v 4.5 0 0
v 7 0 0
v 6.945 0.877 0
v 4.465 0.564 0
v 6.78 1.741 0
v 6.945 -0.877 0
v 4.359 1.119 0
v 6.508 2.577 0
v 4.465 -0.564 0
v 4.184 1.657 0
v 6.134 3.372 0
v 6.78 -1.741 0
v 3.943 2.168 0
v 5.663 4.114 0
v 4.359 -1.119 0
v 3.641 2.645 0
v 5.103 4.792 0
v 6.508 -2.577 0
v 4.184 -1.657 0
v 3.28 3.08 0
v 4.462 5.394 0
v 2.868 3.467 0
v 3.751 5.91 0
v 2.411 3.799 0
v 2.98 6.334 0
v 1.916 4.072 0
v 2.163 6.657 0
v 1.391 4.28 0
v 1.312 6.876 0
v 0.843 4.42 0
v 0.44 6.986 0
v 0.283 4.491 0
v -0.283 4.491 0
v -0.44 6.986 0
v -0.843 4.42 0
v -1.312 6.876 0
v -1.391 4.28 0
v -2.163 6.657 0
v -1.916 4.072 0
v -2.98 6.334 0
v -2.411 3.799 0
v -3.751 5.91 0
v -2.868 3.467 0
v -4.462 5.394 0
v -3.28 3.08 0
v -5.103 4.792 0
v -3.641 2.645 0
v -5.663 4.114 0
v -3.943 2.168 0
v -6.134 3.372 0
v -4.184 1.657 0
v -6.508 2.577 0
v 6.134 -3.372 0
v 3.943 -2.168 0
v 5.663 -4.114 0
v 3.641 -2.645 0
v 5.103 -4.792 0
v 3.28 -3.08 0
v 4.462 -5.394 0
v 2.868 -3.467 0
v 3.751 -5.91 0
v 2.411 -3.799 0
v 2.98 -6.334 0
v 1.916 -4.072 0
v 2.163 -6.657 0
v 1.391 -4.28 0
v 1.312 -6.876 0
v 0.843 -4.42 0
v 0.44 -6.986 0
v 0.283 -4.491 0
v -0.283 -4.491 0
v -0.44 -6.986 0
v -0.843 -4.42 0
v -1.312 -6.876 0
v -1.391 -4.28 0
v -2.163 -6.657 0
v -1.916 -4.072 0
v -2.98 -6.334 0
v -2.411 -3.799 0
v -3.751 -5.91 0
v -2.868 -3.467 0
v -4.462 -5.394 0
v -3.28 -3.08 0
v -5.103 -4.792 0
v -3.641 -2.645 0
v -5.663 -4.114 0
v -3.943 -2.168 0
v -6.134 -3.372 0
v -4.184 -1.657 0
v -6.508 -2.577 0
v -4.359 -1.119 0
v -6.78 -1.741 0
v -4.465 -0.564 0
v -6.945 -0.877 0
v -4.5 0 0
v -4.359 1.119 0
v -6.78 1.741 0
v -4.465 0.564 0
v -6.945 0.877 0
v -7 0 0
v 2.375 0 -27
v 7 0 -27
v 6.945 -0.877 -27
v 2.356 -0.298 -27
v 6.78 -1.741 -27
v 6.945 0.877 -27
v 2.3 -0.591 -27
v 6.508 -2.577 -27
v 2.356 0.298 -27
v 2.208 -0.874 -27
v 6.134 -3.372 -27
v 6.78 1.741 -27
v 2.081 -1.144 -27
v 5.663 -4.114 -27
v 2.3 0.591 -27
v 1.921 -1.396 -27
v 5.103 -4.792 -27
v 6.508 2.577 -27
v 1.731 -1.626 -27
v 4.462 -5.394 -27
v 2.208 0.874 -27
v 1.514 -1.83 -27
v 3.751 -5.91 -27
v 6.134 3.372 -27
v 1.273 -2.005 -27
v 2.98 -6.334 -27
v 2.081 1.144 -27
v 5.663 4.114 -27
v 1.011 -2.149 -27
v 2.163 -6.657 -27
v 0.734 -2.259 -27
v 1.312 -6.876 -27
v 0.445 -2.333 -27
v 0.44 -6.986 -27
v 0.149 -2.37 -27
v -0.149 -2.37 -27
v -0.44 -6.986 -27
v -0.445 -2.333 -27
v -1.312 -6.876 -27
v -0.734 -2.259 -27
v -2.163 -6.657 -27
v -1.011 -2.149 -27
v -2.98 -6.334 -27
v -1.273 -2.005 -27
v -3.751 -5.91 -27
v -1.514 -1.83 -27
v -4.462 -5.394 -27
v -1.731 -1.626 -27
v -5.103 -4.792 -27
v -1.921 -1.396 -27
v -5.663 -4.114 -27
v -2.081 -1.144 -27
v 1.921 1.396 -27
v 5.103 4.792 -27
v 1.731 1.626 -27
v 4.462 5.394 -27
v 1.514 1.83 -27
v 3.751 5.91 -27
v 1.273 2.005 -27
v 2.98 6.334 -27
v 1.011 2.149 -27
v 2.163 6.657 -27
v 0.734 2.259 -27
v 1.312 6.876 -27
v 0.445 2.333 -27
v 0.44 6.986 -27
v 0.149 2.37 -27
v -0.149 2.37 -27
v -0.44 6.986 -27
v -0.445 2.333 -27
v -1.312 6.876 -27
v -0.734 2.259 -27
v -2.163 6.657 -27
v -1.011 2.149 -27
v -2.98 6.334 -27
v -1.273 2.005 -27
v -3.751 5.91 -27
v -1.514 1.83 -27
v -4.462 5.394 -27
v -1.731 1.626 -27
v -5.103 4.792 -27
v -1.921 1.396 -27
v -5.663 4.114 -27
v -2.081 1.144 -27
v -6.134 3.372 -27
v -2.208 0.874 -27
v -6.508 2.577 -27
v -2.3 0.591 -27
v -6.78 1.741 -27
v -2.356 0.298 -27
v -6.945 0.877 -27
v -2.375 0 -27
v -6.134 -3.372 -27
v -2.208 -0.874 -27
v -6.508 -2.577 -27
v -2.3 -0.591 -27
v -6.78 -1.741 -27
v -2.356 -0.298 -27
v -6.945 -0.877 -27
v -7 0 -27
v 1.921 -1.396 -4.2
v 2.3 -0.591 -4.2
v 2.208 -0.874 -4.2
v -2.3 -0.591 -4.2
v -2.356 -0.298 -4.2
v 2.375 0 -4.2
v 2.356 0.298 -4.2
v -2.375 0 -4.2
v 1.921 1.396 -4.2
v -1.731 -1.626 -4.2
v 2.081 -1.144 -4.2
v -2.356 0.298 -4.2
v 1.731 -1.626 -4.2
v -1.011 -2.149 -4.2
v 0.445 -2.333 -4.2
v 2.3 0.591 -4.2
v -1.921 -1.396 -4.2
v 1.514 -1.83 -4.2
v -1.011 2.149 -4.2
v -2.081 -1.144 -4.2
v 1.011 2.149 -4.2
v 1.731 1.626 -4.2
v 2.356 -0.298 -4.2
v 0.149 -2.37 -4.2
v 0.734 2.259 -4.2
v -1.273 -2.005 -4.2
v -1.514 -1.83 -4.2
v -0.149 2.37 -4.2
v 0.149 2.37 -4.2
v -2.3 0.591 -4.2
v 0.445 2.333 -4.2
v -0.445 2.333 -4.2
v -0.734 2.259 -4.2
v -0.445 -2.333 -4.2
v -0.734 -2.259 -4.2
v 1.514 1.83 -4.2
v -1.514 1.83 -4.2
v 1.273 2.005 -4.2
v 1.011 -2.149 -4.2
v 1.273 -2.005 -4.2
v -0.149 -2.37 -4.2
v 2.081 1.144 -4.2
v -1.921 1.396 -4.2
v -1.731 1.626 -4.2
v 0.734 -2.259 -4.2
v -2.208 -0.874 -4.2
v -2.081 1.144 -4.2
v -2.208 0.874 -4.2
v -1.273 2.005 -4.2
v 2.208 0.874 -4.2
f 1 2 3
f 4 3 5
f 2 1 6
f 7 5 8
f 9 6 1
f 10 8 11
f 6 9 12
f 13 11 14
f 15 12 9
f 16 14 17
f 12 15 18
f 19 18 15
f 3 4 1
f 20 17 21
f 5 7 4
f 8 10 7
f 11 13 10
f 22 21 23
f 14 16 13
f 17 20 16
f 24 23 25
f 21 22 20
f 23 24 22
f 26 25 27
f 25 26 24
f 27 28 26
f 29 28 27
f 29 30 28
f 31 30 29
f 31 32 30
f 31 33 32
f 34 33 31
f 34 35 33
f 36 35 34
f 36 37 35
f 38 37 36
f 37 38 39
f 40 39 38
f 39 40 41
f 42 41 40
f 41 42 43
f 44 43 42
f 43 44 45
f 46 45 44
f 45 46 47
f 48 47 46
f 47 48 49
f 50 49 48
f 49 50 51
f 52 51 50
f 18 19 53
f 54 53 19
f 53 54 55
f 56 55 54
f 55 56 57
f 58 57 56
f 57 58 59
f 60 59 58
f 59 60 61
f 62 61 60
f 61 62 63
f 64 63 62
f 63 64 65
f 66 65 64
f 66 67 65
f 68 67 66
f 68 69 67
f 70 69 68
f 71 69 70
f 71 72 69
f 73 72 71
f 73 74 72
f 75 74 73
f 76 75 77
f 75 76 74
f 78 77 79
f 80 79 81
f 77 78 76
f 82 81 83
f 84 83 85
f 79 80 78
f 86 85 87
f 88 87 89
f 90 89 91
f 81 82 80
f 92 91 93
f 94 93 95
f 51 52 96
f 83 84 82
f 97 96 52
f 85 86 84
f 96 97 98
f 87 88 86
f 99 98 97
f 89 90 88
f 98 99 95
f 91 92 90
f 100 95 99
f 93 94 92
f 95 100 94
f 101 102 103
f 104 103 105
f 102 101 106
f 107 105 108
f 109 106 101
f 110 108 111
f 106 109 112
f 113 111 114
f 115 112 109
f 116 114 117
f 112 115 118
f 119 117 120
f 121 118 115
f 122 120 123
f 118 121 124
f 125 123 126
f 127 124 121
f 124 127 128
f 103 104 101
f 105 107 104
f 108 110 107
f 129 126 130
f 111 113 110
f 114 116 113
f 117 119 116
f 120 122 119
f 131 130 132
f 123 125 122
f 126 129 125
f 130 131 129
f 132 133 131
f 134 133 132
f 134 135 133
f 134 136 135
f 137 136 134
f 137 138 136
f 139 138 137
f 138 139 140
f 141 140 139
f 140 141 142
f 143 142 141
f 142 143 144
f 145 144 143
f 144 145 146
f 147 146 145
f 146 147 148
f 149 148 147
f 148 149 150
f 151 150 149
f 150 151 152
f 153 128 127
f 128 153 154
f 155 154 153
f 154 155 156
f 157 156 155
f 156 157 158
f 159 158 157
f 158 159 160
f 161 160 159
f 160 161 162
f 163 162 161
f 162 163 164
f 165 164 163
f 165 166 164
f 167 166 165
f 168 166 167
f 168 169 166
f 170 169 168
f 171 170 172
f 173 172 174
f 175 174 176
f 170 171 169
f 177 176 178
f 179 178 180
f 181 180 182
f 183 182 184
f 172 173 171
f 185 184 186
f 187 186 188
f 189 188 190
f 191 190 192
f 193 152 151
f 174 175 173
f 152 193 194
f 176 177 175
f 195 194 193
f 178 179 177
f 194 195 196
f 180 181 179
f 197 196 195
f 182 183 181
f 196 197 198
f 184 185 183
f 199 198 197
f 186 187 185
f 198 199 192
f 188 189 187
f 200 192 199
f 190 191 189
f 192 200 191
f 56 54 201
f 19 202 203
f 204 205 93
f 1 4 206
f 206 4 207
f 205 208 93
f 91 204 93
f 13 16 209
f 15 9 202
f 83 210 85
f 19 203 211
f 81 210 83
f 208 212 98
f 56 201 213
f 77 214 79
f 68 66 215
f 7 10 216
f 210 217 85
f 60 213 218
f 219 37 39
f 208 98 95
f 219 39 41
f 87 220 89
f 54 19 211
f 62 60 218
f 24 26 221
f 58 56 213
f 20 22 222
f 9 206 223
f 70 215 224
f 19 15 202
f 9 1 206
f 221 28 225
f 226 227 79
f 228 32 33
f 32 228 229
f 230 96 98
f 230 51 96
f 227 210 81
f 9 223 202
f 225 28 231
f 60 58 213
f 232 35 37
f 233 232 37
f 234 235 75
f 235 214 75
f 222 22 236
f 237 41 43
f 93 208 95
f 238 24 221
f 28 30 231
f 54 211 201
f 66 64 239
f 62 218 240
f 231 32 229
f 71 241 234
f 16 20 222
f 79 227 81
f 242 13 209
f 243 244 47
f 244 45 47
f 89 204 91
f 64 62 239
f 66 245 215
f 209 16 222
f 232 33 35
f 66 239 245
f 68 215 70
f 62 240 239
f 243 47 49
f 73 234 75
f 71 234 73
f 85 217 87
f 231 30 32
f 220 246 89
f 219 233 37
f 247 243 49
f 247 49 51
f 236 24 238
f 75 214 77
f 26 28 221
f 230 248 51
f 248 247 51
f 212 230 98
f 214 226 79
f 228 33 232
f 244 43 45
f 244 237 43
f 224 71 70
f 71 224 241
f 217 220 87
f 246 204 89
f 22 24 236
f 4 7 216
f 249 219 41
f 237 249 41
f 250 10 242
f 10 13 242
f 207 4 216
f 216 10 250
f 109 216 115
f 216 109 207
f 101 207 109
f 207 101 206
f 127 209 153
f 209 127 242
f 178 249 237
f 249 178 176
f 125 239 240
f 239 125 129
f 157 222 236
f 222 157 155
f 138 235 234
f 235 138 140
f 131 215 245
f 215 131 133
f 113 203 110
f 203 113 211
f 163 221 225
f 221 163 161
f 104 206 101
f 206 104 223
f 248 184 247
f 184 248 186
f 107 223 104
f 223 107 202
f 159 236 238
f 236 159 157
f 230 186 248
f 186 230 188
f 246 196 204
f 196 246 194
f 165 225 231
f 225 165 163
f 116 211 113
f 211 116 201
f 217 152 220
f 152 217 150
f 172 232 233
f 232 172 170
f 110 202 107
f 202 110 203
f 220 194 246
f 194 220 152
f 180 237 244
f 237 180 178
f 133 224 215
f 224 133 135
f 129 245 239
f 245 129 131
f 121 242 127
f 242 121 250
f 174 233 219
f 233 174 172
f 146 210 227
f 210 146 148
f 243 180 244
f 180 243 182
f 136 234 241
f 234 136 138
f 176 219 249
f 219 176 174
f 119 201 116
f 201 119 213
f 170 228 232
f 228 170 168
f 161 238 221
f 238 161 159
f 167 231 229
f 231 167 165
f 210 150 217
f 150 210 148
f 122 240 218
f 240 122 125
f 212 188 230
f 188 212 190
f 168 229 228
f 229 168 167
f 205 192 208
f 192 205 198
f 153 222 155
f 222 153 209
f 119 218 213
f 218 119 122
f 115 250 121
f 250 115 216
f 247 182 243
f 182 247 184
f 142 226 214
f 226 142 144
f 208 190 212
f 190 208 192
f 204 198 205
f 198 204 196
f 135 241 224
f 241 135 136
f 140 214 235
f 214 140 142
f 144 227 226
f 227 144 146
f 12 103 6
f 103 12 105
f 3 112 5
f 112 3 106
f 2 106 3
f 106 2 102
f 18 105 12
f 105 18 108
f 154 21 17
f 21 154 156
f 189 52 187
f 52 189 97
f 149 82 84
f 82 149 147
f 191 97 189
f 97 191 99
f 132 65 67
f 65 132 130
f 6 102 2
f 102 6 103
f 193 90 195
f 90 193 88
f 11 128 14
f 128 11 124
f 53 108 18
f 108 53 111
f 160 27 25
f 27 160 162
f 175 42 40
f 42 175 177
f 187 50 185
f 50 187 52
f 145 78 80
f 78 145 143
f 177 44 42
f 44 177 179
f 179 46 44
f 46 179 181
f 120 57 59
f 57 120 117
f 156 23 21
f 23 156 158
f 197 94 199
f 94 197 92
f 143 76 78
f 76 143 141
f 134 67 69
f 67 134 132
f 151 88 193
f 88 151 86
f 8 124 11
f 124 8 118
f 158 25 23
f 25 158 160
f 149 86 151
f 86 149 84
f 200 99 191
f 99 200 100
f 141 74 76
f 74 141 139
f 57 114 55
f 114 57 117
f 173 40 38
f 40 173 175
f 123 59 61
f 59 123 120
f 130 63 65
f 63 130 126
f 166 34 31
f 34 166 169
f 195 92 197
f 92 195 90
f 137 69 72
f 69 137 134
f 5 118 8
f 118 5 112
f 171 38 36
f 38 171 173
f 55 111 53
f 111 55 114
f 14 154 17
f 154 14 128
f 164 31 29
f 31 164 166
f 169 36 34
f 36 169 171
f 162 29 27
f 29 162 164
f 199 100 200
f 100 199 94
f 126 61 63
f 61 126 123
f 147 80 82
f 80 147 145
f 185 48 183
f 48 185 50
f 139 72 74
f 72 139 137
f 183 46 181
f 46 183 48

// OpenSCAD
$fn = 50;


difference() {
	union() {
		translate(v = [0, 0, -27.0000000000]) {
			cylinder(h = 27, r = 7.0000000000);
		}
	}
	union() {
		translate(v = [0, 0, 0]) {
			rotate(a = [0, 0, 0]) {
				difference() {
					union() {
						#translate(v = [0, 0, -27.0000000000]) {
							cylinder(h = 27, r = 2.2500000000);
						}
						#translate(v = [0, 0, -4.2000000000]) {
							cylinder(h = 4.2000000000, r1 = 2.3750000000, r2 = 4.5000000000);
						}
						#translate(v = [0, 0, -27.0000000000]) {
							cylinder(h = 27, r = 2.3750000000);
						}
						#translate(v = [0, 0, -27.0000000000]) {
							cylinder(h = 27, r = 2.2500000000);
						}
					}
					union();
				}
			}
		}
	}
}
